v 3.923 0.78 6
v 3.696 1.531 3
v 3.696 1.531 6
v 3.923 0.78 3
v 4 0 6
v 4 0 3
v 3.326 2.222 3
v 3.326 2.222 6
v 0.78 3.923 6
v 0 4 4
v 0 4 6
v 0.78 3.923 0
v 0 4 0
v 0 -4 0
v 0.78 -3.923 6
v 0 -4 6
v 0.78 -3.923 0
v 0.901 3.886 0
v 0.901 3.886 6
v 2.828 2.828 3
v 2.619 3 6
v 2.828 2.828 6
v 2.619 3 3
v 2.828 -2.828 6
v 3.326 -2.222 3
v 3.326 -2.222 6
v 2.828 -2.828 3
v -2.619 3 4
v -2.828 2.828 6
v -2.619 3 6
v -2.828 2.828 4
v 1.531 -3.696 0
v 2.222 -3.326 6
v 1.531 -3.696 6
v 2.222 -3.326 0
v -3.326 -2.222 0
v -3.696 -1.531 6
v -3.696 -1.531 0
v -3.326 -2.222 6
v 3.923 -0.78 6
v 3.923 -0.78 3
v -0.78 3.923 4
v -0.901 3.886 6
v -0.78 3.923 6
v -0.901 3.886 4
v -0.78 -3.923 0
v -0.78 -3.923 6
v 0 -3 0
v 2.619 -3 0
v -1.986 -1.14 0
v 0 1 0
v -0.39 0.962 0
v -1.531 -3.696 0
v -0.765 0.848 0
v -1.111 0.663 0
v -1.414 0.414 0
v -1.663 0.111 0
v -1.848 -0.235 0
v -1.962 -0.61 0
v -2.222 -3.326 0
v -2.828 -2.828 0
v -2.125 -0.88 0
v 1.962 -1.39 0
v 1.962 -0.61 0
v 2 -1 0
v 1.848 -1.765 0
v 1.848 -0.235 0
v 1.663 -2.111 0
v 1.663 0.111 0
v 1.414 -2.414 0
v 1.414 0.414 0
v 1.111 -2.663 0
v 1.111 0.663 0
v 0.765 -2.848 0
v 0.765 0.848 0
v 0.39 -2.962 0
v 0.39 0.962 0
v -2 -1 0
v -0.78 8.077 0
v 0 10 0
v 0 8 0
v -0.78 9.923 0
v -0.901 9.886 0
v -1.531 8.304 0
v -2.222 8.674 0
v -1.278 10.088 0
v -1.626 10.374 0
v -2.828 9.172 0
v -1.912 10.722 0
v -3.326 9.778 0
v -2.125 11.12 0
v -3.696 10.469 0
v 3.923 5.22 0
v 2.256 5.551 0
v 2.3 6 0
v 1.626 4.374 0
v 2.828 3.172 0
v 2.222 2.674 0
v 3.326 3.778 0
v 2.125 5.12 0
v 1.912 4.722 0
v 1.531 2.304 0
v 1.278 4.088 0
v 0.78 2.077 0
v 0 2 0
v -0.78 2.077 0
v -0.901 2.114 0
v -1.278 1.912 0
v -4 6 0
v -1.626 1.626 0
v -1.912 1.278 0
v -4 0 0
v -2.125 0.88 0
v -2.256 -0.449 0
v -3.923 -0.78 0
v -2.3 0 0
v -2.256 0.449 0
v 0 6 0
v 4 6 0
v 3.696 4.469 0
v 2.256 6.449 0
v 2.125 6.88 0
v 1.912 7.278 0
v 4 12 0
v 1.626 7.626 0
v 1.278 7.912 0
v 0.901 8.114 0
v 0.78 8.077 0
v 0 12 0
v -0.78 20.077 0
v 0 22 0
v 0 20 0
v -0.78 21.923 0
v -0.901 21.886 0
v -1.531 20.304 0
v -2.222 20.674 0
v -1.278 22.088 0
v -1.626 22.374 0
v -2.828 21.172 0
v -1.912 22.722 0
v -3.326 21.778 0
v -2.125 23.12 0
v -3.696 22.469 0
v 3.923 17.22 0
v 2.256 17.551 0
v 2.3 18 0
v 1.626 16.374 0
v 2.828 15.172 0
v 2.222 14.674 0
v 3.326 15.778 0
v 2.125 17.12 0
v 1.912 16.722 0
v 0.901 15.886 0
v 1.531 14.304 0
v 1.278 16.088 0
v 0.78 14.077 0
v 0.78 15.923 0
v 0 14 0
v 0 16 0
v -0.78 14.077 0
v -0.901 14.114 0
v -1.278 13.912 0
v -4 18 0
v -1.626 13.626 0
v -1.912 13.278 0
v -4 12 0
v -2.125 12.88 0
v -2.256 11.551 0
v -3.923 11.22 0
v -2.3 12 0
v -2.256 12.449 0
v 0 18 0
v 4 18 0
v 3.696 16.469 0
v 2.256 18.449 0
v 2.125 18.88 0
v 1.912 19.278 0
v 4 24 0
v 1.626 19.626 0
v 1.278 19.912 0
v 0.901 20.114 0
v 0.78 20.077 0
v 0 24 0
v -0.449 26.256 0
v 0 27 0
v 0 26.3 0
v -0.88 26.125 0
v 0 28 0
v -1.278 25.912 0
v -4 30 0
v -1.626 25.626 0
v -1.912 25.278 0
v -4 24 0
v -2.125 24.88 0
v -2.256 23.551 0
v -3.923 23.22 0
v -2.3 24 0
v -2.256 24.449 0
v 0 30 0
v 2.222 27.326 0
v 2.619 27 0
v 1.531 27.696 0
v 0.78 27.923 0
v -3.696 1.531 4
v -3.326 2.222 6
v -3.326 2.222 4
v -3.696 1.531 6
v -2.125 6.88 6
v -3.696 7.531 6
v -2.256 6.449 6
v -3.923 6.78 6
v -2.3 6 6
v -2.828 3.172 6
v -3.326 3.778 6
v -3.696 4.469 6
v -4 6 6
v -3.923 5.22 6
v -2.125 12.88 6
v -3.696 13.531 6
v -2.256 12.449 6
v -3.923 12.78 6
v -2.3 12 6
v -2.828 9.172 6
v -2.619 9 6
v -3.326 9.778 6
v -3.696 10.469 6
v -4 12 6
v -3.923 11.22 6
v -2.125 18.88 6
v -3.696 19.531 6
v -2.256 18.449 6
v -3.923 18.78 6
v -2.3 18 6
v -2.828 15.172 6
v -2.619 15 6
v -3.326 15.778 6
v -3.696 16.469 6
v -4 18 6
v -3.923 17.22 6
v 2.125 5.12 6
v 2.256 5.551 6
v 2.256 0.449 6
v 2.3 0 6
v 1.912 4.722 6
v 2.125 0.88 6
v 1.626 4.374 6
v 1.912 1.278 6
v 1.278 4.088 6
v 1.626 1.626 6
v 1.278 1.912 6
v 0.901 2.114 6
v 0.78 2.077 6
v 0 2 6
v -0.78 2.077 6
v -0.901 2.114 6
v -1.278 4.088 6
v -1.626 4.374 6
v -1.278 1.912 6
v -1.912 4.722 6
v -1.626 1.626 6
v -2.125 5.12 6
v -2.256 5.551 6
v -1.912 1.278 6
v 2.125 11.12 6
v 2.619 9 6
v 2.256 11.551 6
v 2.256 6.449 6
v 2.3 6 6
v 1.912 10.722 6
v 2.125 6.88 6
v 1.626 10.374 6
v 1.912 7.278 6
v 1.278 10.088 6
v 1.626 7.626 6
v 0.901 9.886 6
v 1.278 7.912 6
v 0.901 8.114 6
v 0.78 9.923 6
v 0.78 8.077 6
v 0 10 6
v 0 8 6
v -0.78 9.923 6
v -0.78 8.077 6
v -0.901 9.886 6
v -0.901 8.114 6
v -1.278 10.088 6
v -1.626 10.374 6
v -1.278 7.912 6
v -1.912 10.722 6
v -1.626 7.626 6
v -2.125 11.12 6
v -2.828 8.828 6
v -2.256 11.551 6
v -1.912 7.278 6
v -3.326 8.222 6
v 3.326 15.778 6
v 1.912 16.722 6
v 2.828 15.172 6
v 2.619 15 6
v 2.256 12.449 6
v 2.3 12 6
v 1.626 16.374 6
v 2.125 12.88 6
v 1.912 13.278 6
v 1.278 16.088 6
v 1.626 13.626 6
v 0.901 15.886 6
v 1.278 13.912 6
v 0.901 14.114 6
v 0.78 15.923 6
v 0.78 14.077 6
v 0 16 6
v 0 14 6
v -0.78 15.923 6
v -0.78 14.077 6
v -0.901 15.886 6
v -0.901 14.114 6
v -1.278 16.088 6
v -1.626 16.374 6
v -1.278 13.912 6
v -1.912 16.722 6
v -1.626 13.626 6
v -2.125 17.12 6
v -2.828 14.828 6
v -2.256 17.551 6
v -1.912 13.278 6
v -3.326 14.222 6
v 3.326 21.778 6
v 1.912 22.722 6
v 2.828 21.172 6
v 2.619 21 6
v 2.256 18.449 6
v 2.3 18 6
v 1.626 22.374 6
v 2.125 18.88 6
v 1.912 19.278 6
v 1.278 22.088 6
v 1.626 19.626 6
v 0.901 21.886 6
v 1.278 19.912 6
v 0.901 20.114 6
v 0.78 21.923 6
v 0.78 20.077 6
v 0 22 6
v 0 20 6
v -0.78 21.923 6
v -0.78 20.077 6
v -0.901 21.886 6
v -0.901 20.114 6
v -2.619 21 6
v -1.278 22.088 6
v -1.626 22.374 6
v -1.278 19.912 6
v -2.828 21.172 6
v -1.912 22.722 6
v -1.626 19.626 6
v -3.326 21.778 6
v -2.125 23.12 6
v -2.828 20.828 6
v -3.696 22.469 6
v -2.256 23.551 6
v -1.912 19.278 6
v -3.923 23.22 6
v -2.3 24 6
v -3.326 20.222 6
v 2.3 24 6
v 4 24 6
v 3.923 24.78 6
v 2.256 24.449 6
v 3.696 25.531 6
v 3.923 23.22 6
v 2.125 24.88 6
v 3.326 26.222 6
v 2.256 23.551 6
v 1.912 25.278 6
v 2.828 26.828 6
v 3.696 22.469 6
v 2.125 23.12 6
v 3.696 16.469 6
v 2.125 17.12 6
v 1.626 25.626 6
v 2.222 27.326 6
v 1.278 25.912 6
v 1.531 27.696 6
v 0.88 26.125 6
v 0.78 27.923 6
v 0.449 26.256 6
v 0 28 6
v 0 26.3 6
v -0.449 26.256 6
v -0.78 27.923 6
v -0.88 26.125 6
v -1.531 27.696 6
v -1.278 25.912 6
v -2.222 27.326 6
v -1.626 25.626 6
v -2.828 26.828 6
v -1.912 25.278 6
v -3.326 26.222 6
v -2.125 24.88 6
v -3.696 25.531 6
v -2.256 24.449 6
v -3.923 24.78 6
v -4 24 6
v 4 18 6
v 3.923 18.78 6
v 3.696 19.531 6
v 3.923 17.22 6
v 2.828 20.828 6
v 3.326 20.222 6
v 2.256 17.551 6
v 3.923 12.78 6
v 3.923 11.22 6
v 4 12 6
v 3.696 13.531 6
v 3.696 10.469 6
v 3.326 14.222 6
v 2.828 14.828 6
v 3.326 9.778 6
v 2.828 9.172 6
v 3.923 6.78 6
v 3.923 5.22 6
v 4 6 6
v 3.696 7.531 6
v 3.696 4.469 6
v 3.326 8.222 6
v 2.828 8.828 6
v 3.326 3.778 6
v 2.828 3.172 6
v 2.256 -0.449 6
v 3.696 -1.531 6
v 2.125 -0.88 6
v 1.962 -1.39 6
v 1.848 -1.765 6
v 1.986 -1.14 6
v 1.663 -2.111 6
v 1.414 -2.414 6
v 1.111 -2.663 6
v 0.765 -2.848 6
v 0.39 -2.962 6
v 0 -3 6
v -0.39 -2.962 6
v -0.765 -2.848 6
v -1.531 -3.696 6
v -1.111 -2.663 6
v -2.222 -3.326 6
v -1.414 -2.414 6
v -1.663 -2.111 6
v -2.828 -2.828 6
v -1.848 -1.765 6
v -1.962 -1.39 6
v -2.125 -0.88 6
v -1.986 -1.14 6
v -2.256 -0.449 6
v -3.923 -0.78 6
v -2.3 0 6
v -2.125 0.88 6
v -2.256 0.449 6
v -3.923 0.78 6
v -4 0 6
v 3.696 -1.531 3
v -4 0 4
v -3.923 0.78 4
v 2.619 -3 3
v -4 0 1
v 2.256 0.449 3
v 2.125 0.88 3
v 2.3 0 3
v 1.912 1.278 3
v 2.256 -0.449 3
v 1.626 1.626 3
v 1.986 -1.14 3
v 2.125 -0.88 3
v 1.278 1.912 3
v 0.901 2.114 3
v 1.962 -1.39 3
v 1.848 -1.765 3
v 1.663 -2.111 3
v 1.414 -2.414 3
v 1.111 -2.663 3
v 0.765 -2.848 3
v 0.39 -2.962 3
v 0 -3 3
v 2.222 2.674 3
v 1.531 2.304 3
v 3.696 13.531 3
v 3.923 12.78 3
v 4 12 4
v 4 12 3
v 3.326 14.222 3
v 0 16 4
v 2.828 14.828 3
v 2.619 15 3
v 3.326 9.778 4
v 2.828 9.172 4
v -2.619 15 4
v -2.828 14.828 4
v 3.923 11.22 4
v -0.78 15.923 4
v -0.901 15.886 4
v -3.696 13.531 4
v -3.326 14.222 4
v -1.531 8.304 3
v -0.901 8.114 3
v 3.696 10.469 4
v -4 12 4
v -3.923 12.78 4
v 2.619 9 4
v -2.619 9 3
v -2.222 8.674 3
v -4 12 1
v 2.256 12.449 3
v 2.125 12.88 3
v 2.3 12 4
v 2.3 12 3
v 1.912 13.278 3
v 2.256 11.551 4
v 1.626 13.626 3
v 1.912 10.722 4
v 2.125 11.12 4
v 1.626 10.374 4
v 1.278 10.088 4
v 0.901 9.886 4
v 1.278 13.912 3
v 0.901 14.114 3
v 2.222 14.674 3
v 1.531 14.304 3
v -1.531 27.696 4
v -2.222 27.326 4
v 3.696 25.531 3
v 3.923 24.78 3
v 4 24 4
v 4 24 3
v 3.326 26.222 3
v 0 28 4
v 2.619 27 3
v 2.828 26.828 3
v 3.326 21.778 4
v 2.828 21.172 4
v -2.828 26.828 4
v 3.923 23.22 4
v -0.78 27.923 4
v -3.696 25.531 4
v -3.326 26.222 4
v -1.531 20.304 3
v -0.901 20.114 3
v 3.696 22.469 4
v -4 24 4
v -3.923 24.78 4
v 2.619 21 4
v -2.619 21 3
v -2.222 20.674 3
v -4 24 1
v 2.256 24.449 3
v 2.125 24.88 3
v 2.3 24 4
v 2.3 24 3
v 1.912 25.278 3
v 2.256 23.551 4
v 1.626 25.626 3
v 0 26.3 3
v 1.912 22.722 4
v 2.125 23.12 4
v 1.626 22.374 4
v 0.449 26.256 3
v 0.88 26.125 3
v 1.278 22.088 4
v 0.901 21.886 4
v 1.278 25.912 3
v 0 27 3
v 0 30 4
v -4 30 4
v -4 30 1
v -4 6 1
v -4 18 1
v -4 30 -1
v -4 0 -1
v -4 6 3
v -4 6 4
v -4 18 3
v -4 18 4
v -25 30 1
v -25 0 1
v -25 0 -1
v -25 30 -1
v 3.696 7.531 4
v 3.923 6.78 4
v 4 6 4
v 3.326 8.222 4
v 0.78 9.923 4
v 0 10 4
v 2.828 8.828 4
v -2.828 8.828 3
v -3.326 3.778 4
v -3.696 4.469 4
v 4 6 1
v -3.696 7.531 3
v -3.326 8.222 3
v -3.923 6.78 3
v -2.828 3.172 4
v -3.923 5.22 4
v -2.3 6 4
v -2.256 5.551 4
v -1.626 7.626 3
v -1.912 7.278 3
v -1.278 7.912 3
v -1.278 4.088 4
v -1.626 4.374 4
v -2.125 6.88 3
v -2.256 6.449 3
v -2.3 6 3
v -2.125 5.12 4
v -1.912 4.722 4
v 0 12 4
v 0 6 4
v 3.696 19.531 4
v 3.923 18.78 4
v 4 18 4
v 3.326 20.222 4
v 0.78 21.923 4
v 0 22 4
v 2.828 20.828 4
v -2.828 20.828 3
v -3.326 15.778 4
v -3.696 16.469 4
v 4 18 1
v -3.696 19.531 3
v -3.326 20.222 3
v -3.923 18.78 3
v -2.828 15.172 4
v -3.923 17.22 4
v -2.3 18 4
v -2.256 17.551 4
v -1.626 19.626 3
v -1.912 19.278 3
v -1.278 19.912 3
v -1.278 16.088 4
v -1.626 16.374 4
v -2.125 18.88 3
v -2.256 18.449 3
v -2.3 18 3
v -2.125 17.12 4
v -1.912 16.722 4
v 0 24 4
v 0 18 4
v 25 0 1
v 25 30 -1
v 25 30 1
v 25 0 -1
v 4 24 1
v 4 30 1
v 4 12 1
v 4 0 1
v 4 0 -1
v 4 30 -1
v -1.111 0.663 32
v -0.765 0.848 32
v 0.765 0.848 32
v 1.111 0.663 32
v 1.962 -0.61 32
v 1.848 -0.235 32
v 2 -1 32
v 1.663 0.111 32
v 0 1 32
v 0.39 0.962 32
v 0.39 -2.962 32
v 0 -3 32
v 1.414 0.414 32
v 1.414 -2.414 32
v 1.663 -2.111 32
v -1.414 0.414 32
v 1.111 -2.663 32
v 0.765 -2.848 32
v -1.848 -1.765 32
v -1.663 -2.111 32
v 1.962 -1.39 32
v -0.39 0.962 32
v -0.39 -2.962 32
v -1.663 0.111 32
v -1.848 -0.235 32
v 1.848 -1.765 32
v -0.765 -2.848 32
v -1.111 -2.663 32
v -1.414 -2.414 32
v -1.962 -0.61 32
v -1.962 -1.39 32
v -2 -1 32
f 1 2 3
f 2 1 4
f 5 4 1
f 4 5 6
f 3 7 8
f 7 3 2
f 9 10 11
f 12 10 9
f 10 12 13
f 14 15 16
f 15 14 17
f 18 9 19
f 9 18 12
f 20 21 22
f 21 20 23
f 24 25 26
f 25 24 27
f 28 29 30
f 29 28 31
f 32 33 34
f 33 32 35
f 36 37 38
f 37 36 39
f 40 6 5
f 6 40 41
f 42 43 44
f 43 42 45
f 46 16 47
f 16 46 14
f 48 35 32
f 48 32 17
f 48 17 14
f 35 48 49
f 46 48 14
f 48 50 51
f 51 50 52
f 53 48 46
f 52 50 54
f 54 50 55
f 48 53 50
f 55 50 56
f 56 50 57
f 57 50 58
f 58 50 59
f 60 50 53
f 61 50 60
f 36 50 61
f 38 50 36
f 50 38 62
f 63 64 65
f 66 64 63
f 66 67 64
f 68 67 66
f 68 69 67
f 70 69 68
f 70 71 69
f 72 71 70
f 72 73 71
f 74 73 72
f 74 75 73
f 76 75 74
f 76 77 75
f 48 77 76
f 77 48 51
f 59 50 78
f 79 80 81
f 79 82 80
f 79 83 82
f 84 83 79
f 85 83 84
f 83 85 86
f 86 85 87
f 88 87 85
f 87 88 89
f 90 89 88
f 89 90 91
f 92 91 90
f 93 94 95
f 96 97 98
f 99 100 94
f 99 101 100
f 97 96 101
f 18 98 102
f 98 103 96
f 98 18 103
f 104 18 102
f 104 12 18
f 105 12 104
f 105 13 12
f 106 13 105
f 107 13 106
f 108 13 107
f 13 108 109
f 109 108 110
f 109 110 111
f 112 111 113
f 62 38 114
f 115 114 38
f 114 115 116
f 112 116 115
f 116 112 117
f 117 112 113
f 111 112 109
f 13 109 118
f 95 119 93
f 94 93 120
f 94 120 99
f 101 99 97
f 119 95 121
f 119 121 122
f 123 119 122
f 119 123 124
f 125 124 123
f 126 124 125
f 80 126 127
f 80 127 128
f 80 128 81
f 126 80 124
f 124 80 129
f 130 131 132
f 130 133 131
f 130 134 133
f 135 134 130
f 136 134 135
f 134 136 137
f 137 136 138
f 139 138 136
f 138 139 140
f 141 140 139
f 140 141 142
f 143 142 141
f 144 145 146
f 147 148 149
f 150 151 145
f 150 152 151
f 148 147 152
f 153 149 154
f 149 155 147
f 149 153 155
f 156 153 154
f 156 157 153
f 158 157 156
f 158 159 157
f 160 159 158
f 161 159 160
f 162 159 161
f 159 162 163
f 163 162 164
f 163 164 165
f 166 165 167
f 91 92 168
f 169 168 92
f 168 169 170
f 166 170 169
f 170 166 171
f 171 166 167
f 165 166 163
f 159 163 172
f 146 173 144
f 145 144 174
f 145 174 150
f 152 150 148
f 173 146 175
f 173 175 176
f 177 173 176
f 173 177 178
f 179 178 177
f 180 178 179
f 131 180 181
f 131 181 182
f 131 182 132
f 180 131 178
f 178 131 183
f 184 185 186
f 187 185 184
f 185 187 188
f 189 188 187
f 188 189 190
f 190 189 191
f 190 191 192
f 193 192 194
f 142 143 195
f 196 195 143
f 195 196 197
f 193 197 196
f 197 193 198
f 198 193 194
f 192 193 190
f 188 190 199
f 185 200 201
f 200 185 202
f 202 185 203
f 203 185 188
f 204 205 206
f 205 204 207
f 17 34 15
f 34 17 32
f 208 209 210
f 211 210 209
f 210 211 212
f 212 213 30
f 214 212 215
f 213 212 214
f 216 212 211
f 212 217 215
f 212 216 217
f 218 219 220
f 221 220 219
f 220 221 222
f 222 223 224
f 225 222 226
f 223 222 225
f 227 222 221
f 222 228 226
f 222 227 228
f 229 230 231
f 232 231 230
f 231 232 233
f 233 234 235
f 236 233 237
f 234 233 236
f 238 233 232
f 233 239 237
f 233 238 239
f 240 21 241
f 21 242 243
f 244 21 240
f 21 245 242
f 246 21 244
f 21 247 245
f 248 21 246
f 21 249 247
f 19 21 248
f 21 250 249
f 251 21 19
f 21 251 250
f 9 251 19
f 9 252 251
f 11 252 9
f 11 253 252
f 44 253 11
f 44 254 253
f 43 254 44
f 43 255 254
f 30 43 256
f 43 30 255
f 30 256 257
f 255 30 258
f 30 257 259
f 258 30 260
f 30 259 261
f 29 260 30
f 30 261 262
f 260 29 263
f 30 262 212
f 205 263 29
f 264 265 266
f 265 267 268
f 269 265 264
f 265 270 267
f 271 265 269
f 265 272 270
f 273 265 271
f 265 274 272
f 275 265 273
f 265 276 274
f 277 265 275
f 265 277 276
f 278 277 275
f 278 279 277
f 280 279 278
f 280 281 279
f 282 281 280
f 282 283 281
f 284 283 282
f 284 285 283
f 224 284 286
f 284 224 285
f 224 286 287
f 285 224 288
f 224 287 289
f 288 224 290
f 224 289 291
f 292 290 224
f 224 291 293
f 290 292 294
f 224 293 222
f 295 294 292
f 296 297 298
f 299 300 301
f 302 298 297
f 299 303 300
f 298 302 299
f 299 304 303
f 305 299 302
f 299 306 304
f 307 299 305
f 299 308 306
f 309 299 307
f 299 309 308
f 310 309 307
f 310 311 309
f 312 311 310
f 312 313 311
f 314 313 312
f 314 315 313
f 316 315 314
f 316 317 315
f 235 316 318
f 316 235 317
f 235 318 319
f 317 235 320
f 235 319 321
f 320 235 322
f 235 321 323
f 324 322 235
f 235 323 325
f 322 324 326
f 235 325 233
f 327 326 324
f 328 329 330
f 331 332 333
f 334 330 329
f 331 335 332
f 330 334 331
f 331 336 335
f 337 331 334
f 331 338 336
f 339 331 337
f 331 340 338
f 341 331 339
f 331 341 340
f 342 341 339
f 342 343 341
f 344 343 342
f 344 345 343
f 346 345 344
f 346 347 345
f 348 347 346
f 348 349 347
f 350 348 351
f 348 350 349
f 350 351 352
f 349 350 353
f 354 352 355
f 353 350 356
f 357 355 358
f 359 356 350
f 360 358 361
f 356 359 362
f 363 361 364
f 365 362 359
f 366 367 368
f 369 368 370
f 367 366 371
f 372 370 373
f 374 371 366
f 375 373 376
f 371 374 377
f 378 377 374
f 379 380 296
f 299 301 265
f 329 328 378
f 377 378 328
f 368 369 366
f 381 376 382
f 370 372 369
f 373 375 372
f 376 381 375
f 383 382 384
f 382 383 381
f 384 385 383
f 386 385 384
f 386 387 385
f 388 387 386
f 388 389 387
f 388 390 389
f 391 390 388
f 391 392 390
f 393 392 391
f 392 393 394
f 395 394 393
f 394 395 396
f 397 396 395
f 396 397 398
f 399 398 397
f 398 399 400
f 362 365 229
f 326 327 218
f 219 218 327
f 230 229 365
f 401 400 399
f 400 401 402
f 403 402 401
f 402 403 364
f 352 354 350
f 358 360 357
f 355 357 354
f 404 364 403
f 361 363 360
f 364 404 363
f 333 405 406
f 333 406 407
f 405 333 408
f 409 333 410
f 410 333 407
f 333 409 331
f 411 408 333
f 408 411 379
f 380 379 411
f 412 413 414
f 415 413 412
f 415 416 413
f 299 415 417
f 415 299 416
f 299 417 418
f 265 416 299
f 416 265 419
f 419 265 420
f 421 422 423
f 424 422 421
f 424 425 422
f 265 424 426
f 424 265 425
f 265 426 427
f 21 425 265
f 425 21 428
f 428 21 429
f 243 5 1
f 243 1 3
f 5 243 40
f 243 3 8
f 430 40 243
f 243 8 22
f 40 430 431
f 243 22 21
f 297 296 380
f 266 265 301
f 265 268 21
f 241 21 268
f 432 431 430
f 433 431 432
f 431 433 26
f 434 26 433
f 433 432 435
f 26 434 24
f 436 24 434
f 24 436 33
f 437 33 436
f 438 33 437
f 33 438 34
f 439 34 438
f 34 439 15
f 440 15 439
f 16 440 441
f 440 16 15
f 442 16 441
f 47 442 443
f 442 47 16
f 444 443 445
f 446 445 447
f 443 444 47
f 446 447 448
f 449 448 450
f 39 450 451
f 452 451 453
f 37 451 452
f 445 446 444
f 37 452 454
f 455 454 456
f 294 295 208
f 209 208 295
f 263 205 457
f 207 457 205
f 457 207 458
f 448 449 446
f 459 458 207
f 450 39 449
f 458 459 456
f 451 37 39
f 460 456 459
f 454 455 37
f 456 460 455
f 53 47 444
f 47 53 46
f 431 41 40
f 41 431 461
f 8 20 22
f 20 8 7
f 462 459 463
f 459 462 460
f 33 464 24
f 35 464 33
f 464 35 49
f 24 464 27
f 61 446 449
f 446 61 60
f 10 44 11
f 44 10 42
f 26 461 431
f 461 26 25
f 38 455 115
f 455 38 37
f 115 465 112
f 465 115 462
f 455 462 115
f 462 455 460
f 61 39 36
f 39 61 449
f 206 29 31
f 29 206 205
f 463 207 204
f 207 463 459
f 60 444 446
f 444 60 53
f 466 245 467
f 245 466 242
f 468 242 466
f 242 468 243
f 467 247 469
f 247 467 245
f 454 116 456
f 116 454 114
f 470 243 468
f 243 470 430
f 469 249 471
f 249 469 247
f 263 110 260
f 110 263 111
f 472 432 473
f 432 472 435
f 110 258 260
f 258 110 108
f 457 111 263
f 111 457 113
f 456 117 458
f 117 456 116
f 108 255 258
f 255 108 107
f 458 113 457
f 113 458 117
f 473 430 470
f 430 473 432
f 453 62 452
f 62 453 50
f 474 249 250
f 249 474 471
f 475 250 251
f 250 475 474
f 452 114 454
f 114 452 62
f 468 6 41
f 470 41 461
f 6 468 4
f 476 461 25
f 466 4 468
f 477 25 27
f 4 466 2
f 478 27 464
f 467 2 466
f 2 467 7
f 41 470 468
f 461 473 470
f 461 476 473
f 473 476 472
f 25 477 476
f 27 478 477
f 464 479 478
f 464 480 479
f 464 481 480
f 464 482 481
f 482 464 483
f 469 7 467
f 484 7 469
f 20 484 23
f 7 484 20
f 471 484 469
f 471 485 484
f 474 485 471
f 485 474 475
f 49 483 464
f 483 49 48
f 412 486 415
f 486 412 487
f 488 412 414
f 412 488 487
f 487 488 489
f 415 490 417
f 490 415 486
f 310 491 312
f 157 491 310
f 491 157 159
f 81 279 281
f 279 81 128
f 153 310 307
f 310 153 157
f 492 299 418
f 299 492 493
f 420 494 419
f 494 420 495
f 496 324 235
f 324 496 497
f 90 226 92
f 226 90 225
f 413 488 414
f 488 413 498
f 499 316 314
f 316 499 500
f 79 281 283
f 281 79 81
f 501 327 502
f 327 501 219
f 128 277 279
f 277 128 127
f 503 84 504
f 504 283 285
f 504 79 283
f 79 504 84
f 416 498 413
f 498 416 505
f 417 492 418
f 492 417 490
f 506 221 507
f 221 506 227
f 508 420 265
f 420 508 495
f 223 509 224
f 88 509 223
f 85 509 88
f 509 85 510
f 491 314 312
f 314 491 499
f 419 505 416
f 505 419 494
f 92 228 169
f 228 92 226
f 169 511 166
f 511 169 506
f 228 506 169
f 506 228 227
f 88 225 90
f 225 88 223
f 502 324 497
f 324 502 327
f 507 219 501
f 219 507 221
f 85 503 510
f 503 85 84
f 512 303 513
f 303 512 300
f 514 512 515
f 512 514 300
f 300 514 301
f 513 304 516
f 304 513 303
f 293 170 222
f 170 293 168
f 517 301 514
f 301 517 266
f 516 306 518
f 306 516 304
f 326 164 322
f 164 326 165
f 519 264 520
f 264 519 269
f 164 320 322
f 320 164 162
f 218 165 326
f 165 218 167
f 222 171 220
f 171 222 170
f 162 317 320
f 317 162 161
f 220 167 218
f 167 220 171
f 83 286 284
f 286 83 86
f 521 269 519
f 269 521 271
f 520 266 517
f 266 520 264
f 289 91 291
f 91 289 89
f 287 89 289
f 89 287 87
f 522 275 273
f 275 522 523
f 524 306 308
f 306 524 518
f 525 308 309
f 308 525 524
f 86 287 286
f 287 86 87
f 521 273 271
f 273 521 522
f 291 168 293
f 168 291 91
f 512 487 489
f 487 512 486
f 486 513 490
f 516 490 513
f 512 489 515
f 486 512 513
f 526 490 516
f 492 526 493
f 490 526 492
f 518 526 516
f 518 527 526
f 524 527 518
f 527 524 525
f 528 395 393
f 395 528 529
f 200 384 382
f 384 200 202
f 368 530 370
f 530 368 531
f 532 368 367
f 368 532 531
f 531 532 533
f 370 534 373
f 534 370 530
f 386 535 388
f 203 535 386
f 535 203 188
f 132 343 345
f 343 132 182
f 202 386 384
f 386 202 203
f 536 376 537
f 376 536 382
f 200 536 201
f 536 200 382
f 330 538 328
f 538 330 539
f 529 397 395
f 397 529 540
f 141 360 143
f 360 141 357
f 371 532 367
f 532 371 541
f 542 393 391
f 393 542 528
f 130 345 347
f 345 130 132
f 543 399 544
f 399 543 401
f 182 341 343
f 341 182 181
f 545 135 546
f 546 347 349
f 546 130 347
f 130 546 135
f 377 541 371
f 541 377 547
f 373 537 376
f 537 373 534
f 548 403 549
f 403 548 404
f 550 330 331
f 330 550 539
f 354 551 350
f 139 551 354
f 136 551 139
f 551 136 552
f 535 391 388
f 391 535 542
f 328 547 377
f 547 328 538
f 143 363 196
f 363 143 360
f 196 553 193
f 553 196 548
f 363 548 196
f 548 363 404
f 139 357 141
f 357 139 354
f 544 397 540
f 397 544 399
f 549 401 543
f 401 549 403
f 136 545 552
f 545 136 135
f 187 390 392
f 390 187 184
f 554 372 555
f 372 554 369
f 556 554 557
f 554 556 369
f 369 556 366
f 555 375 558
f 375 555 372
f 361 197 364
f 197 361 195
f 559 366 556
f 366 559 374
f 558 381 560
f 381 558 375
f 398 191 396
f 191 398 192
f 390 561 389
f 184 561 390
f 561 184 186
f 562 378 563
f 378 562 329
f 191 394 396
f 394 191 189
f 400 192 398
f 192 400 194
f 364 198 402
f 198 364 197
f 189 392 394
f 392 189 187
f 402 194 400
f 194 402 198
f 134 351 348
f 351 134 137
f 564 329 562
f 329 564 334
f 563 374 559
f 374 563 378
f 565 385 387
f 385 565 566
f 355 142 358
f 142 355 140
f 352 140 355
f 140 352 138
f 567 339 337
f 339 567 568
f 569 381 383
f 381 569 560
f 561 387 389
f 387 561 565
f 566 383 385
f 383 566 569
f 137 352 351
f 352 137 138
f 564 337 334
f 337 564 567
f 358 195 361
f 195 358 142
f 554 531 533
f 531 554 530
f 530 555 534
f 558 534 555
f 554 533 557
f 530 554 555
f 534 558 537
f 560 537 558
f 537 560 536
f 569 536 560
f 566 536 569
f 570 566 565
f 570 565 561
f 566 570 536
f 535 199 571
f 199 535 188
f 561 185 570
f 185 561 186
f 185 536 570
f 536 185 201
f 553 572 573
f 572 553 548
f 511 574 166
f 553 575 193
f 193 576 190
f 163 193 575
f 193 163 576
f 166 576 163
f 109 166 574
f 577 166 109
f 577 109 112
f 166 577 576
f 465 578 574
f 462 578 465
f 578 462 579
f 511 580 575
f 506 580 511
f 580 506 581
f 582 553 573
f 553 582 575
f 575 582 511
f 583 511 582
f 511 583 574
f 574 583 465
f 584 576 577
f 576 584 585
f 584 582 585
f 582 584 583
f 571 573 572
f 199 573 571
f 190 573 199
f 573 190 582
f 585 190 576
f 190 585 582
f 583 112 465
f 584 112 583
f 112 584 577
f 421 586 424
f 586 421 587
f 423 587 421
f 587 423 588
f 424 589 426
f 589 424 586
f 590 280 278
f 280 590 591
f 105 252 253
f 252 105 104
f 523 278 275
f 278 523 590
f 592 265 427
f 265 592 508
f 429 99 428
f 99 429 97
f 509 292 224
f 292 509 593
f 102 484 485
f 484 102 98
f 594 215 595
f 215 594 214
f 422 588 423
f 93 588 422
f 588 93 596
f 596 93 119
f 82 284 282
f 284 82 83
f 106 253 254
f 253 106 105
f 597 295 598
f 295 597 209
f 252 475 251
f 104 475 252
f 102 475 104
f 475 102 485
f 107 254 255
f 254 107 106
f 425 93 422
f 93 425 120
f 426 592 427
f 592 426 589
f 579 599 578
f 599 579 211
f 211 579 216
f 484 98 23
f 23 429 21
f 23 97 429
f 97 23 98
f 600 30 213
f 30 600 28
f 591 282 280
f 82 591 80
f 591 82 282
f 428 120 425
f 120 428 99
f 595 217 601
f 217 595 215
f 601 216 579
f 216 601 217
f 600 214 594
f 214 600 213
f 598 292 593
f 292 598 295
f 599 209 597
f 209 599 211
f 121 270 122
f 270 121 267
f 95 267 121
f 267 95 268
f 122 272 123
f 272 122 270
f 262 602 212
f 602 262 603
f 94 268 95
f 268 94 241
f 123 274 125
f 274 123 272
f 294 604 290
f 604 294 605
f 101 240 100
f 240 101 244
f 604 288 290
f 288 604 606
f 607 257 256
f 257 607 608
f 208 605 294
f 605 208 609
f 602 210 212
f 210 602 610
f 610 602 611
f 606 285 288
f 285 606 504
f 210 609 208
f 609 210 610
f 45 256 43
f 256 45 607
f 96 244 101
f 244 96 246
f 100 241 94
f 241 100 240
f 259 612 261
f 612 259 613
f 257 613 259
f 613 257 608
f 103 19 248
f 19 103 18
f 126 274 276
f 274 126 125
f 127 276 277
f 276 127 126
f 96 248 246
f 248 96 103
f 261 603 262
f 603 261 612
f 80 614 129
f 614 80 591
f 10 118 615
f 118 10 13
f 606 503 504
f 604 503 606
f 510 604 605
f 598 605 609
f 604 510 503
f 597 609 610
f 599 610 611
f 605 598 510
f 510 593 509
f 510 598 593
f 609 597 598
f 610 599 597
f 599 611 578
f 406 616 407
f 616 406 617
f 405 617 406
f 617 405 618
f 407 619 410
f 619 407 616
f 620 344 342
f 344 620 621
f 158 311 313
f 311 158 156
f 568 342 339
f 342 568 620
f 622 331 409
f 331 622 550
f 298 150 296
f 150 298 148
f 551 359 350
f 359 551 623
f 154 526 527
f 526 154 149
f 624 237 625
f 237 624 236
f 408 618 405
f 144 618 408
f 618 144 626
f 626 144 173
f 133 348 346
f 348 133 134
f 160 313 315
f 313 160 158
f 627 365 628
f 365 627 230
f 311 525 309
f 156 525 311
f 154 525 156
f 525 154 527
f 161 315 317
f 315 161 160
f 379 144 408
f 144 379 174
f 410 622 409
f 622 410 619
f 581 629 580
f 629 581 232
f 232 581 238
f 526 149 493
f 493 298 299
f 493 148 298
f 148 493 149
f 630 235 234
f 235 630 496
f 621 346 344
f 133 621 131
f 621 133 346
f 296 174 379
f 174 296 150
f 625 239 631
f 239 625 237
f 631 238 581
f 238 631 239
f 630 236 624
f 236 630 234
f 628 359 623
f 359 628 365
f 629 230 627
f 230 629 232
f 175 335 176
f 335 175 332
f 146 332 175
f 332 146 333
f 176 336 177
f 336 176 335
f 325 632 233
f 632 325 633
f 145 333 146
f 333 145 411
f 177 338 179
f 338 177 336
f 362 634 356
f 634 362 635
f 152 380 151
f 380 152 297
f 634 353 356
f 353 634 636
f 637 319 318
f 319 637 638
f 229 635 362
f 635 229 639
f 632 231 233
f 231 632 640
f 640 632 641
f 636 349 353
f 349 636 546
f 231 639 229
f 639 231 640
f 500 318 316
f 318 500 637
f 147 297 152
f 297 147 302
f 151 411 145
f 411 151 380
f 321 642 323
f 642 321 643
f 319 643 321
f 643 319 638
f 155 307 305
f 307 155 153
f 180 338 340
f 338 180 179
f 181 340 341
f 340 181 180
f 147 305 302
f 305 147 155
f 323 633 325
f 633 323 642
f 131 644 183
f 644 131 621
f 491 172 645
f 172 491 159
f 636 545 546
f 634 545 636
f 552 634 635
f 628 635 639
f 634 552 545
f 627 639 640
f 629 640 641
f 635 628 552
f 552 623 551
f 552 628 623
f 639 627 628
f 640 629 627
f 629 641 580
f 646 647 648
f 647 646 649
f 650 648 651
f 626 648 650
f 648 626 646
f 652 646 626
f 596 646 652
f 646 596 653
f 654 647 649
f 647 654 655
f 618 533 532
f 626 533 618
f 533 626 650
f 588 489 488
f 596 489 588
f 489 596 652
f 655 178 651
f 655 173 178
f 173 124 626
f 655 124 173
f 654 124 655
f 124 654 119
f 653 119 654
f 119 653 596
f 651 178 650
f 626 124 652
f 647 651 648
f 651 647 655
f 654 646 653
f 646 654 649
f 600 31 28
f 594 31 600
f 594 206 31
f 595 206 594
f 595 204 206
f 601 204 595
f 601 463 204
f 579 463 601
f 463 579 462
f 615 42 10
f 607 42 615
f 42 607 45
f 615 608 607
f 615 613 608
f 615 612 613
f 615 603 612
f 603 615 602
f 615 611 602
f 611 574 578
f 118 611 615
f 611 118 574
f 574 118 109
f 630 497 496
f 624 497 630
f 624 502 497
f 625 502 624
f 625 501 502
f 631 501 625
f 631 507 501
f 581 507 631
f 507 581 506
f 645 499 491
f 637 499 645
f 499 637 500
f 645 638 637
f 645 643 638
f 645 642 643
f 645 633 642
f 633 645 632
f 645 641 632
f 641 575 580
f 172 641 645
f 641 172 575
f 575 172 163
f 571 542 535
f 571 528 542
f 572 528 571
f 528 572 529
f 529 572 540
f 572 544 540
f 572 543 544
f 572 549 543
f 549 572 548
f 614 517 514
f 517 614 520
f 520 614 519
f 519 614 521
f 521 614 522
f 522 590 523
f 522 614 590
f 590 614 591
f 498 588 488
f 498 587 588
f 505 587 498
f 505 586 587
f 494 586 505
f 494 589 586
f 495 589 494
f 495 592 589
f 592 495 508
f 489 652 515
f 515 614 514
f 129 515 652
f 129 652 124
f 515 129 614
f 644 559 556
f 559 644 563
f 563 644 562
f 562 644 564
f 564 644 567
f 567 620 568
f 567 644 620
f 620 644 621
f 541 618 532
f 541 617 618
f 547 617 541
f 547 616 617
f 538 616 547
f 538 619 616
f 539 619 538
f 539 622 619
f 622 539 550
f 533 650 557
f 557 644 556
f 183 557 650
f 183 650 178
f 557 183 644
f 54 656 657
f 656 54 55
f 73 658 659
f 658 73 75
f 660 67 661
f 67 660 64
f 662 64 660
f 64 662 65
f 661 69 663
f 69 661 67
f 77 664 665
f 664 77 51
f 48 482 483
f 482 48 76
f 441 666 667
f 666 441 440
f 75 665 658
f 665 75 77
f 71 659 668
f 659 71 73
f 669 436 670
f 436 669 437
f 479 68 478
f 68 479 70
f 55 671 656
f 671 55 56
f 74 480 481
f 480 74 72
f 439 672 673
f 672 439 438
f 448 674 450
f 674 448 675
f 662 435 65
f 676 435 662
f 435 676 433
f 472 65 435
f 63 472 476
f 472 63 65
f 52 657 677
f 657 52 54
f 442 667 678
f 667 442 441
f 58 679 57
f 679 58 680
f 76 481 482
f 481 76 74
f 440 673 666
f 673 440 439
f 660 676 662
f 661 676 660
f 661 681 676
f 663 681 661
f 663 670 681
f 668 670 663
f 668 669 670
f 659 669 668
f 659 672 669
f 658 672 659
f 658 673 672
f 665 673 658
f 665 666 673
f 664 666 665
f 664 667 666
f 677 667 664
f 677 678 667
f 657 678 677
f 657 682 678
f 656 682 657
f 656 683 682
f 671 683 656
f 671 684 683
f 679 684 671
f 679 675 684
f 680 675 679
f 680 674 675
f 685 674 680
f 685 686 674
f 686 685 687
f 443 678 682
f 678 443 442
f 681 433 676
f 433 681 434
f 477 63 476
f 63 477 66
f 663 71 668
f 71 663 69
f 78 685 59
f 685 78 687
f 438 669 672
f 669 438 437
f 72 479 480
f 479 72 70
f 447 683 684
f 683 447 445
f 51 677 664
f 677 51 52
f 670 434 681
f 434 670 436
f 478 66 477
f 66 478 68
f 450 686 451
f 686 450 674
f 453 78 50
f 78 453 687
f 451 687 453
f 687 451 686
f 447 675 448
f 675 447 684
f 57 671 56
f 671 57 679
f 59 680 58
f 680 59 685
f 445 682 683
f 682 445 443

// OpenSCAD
// Butt hinge parameters
leaf_width = 25;
leaf_height = 30;
leaf_thickness = 2;
pin_diameter = 4;
pin_length = 32;
knuckle_outer_diameter = 8;
knuckle_inner_diameter = 4.6;
knuckle_height = 6;
num_knuckles = 5;

// Screw hole parameters
screw_hole_diameter = 3.2;
countersink_diameter = 6;
countersink_depth = 1;
screw_spacing = 8;

// Pin (centered on Y-axis)
color("Silver")
translate([0, -1, 0])
cylinder(h = pin_length, d = pin_diameter, $fn = 32);

// Left leaf (x < 0)
color("DarkGray")
translate([0, 0, 0])
union() {
    // Flat plate
    translate([-leaf_width, 0, -leaf_thickness/2])
    cube([leaf_width - knuckle_outer_diameter/2, leaf_height, leaf_thickness]);
    
    // Knuckles (positions 0, 2, 4)
    for (i = [0, 2, 4]) {
        translate([0, i * knuckle_height, 0])
        difference() {
            cylinder(h = knuckle_height, d = knuckle_outer_diameter, $fn = 32);
            cylinder(h = knuckle_height, d = knuckle_inner_diameter, $fn = 32);
            // Cut half cylinder
            translate([knuckle_outer_diameter/2, 0, 0])
            cube([knuckle_outer_diameter, knuckle_height, knuckle_height], center = true);
        }
    }
    
    // Screw holes
    for (i = [0, 1, 2]) {
        translate([-leaf_width * 0.6, leaf_height/2 + (i - 1) * screw_spacing, 0])
        difference() {
            cylinder(h = 0.01, d = 0.01); // Dummy for union
            // Countersink
            translate([0, 0, leaf_thickness/2 - countersink_depth])
            cylinder(h = countersink_depth, d1 = screw_hole_diameter, d2 = countersink_diameter, $fn = 32);
            // Through hole
            translate([0, 0, -leaf_thickness/2 - 0.1])
            cylinder(h = leaf_thickness + 0.2, d = screw_hole_diameter, $fn = 32);
        }
    }
}

// Right leaf (x > 0)
color("DarkGray")
translate([0, 0, 0])
union() {
    // Flat plate
    translate([knuckle_outer_diameter/2, 0, -leaf_thickness/2])
    cube([leaf_width - knuckle_outer_diameter/2, leaf_height, leaf_thickness]);
    
    // Knuckles (positions 1, 3)
    for (i = [1, 3]) {
        translate([0, i * knuckle_height, 0])
        difference() {
            cylinder(h = knuckle_height, d = knuckle_outer_diameter, $fn = 32);
            cylinder(h = knuckle_height, d = knuckle_inner_diameter, $fn = 32);
            // Cut half cylinder
            translate([-knuckle_outer_diameter/2, 0, 0])
            cube([knuckle_outer_diameter, knuckle_height, knuckle_height], center = true);
        }
    }
    
    // Screw holes
    for (i = [0, 1, 2]) {
        translate([leaf_width * 0.6, leaf_height/2 + (i - 1) * screw_spacing, 0])
        difference() {
            cylinder(h = 0.01, d = 0.01); // Dummy for union
            // Countersink
            translate([0, 0, leaf_thickness/2 - countersink_depth])
            cylinder(h = countersink_depth, d1 = screw_hole_diameter, d2 = countersink_diameter, $fn = 32);
            // Through hole
            translate([0, 0, -leaf_thickness/2 - 0.1])
            cylinder(h = leaf_thickness + 0.2, d = screw_hole_diameter, $fn = 32);
        }
    }
}

// Apply screw holes to leaves
difference() {
    union() {
        // Left leaf base
        color("DarkGray")
        translate([-leaf_width, 0, -leaf_thickness/2])
        cube([leaf_width - knuckle_outer_diameter/2, leaf_height, leaf_thickness]);
        
        // Right leaf base
        color("DarkGray")
        translate([knuckle_outer_diameter/2, 0, -leaf_thickness/2])
        cube([leaf_width - knuckle_outer_diameter/2, leaf_height, leaf_thickness]);
    }
    
    // Left leaf screw holes
    for (i = [0, 1, 2]) {
        translate([-leaf_width * 0.6, leaf_height/2 + (i - 1) * screw_spacing, 0]) {
            // Countersink
            translate([0, 0, leaf_thickness/2 - countersink_depth])
            cylinder(h = countersink_depth + 0.1, d1 = screw_hole_diameter, d2 = countersink_diameter, $fn = 32);
            // Through hole
            cylinder(h = leaf_thickness + 1, d = screw_hole_diameter, center = true, $fn = 32);
        }
    }
    
    // Right leaf screw holes
    for (i = [0, 1, 2]) {
        translate([leaf_width * 0.6, leaf_height/2 + (i - 1) * screw_spacing, 0]) {
            // Countersink
            translate([0, 0, leaf_thickness/2 - countersink_depth])
            cylinder(h = countersink_depth + 0.1, d1 = screw_hole_diameter, d2 = countersink_diameter, $fn = 32);
            // Through hole
            cylinder(h = leaf_thickness + 1, d = screw_hole_diameter, center = true, $fn = 32);
        }
    }
}

// Knuckles
color("DarkGray") {
    // Left leaf knuckles
    for (i = [0, 2, 4]) {
        translate([0, i * knuckle_height, 0])
        difference() {
            translate([-knuckle_outer_diameter/2, 0, 0])
            cube([knuckle_outer_diameter/2, knuckle_height, knuckle_outer_diameter/2]);
            cylinder(h = knuckle_height, d = knuckle_inner_diameter, $fn = 32);
        }
    }
    
    // Right leaf knuckles
    for (i = [1, 3]) {
        translate([0, i * knuckle_height, 0])
        difference() {
            translate([0, 0, 0])
            cube([knuckle_outer_diameter/2, knuckle_height, knuckle_outer_diameter/2]);
            cylinder(h = knuckle_height, d = knuckle_inner_diameter, $fn = 32);
        }
    }
}
